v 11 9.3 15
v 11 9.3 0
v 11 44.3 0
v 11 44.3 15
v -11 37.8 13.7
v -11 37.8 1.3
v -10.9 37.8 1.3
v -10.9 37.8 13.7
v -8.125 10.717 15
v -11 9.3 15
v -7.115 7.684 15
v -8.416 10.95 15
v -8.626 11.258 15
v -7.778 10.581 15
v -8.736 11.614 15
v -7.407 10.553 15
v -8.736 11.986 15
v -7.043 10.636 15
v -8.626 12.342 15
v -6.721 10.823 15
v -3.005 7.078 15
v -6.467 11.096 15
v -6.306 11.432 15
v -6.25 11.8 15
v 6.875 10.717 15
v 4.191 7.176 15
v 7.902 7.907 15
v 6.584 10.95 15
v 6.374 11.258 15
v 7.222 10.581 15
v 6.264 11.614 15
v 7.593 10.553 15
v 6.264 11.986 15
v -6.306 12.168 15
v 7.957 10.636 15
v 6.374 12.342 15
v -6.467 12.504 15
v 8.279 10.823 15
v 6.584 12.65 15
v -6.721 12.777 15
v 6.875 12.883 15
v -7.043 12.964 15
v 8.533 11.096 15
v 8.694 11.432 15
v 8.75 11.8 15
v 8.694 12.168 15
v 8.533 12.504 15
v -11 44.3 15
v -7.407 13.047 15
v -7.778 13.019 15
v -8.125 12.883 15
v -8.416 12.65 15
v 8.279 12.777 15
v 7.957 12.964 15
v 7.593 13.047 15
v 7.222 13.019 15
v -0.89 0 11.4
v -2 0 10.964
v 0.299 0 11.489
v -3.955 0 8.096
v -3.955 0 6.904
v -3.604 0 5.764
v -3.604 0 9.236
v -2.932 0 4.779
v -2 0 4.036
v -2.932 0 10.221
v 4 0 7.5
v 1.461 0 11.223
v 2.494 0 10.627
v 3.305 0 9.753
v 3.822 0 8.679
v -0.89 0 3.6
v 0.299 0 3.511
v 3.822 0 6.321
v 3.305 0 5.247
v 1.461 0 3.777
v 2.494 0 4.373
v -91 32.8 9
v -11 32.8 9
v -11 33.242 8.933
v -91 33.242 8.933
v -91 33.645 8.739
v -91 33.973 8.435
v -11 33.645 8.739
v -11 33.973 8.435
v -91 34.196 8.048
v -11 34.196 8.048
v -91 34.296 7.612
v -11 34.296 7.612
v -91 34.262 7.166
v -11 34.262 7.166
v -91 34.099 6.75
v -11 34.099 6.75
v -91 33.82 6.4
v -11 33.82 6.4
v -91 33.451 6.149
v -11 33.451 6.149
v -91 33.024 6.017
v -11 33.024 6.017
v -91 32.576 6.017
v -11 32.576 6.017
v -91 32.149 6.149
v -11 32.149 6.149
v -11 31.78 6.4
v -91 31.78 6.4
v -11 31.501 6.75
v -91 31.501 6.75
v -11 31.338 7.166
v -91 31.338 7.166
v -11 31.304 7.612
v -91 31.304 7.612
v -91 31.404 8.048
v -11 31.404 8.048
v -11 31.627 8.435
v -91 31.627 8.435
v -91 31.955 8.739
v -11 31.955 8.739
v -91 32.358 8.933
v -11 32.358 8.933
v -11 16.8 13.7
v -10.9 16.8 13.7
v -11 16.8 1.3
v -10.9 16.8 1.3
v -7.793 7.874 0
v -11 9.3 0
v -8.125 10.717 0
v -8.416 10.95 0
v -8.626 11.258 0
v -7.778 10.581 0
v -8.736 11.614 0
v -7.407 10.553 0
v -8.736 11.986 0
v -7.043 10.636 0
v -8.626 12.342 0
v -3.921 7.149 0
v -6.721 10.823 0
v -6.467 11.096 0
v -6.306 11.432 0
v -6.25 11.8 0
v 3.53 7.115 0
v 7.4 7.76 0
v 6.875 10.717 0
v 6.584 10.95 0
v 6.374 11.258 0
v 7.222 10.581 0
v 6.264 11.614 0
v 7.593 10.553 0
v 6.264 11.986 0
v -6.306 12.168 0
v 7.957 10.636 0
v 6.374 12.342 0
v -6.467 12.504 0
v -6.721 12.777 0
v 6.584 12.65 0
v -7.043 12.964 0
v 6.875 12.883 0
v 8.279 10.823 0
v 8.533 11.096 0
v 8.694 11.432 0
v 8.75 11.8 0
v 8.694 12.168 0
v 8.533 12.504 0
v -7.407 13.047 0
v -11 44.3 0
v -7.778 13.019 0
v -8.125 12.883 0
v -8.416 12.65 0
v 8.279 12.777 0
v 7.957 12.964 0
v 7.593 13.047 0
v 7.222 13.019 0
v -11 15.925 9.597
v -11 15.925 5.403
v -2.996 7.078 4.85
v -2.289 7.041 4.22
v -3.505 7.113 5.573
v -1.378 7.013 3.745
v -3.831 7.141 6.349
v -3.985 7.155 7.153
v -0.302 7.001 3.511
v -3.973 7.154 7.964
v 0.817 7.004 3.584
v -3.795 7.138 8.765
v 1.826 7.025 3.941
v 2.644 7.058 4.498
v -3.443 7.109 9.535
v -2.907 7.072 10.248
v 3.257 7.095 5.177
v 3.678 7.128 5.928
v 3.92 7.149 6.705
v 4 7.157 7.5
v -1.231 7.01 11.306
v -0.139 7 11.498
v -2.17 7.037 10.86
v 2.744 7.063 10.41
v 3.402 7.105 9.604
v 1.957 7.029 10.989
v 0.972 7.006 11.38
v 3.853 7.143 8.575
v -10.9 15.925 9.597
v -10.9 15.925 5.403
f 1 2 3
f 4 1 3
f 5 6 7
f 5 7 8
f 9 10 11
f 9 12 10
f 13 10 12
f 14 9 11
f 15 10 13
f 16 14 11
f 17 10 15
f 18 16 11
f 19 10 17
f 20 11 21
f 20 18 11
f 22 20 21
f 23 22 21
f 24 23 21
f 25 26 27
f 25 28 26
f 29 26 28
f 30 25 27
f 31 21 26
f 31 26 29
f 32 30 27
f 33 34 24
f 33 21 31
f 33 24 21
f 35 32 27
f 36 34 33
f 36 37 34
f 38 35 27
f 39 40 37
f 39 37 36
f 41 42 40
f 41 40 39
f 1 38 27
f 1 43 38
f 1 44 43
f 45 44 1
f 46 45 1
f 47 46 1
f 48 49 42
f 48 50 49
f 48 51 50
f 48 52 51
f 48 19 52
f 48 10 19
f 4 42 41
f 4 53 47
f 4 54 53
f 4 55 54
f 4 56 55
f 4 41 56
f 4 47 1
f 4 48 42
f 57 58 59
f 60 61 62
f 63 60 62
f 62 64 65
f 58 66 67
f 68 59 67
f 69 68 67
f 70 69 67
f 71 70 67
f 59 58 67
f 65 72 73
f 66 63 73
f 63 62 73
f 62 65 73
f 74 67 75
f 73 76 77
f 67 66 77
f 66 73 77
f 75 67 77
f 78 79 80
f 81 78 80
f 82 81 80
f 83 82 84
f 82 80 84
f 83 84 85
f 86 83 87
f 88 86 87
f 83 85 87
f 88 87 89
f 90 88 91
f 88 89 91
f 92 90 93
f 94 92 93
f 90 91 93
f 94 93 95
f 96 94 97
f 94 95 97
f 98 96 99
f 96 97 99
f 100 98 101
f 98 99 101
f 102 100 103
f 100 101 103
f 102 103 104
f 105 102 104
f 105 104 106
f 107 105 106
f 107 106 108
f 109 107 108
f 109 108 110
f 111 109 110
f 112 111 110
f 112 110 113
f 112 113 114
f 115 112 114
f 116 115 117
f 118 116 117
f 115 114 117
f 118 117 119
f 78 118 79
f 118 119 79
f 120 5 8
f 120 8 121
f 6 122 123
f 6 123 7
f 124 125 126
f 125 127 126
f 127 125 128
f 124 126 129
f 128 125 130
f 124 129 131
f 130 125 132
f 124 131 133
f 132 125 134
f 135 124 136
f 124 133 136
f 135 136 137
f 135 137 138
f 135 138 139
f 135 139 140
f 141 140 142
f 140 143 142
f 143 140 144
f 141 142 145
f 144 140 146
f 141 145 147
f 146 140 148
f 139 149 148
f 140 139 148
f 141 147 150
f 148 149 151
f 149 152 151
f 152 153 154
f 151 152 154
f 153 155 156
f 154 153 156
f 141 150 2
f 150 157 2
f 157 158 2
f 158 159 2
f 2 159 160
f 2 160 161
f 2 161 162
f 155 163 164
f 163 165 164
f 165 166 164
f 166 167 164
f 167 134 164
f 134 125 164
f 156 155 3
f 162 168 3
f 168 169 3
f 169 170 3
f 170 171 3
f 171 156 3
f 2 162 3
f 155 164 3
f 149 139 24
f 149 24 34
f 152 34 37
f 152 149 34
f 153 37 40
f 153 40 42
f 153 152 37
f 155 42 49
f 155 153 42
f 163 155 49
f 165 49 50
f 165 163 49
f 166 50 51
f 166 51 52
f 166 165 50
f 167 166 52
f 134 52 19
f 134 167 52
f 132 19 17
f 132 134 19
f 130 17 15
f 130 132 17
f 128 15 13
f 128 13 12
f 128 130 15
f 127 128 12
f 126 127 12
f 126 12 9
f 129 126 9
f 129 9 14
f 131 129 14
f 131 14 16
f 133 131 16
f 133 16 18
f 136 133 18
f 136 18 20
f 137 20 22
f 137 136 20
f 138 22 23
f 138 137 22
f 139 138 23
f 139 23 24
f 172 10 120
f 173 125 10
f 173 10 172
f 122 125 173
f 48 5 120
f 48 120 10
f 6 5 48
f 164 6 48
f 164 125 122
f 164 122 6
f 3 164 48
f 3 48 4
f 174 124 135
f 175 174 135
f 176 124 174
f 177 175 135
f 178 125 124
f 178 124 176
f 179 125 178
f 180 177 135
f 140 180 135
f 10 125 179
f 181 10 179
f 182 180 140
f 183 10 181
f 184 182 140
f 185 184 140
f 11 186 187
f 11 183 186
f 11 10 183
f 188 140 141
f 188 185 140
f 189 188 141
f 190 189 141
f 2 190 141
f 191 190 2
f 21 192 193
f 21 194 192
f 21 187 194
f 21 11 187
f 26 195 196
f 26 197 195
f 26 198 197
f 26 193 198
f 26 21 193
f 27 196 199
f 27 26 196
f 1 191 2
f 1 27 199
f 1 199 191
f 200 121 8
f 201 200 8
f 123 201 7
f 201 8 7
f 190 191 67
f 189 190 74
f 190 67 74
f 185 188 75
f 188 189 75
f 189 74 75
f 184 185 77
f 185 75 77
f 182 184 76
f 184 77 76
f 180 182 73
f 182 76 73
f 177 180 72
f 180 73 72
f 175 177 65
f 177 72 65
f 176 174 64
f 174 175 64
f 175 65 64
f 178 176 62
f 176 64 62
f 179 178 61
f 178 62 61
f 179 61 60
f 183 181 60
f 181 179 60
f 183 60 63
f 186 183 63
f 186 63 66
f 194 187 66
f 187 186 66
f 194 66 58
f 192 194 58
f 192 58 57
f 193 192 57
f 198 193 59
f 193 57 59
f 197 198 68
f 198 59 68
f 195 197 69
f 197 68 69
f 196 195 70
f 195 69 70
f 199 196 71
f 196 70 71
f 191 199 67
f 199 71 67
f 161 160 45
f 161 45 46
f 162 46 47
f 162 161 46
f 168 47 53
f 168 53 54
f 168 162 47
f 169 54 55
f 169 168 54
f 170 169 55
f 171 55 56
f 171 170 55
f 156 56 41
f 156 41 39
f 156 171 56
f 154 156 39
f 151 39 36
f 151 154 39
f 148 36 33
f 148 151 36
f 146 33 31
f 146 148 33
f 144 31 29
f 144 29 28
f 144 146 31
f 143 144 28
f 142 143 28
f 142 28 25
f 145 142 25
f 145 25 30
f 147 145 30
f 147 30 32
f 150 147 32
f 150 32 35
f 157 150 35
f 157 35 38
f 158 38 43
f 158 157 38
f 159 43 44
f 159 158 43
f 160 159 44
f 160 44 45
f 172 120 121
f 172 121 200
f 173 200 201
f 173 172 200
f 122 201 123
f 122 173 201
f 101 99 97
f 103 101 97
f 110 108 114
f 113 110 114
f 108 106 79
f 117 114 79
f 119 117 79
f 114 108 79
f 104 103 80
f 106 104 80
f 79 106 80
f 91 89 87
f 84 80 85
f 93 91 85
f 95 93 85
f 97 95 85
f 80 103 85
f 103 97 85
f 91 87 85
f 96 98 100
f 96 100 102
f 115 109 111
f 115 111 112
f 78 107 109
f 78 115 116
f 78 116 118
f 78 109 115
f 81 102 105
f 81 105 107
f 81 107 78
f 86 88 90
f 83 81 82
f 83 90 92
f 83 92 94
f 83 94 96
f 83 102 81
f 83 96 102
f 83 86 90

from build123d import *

# Parameters (mm, degrees)
ESQUISSE1_W             = 22
ESQUISSE1_H             = 44.3
ESQUISSE1_R             = 1.25
BOSS_EXTRU_1_DEPTH      = 15
ENL_V_MAT_EXTRU_1_DEPTH = 16
BOSS_EXTRU_2_REACH      = 46.3
ESQUISSE3_R             = 4
ENL_V_MAT_EXTRU_2_DEPTH = 0.1
ESQUISSE5_R             = 1.5
BOSS_EXTRU_3_DEPTH      = 80


with BuildPart() as part:
    # Esquisse1 → Boss.-Extru.1 (new body)
    with BuildSketch(Plane.XY):
        with Locations((0, 22.15)):
            Rectangle(ESQUISSE1_W, ESQUISSE1_H)
        with Locations((7.5, 11.8)):
            Circle(ESQUISSE1_R, mode=Mode.SUBTRACT)
        with Locations((-7.5, 11.8)):
            Circle(ESQUISSE1_R, mode=Mode.SUBTRACT)
    extrude(amount=BOSS_EXTRU_1_DEPTH)

    # Esquisse2 → Enlèv. mat.-Extru.1 (cut, through all)
    with BuildSketch(Plane.XY.offset(15)):
        with BuildLine():
            Line((-11, 9.3), (-11, 0))
            Line((-11, 0), (11, 0))
            Line((11, 0), (11, 9.3))
            add(Edge.make_bspline(
                [(-11, 9.3), (-7.625374572, 7.236730077), (0, 6.763269923), (7.625374572, 7.236730077), (11, 9.3)],
                knots=[0, 0, 0, 0, 0.5, 1, 1, 1, 1], degree=3))
        make_face()
    extrude(amount=-ENL_V_MAT_EXTRU_1_DEPTH, mode=Mode.SUBTRACT)

    # Esquisse3 → Boss.-Extru.2 (add, up to next)
    with BuildSketch(Plane(origin=(0, 0, 0), x_dir=(1, 0, 0), z_dir=(0, 1, 0)), mode=Mode.PRIVATE) as boss_extru_2_sk1:
        with Locations((0, -7.5)):
            Circle(ESQUISSE3_R)
    boss_extru_2_tool1 = extrude(boss_extru_2_sk1.sketch, amount=BOSS_EXTRU_2_REACH, mode=Mode.PRIVATE) - part.part
    add(boss_extru_2_tool1.solids().sort_by_distance((0, 0, 7.5))[0])

    # Esquisse4 → Enlèv. mat.-Extru.2 (cut)
    with BuildSketch(Plane.ZY.offset(11)):
        with BuildLine():
            Line((1.3, 37.8), (13.7, 37.8))
            Line((13.7, 37.8), (13.7, 16.8))
            ThreePointArc((13.7, 16.8), (7.5, 15.814731131), (1.3, 16.8))
            Line((1.3, 16.8), (1.3, 37.8))
        make_face()
    extrude(amount=-ENL_V_MAT_EXTRU_2_DEPTH, mode=Mode.SUBTRACT)


with BuildPart() as body_2:
    # Esquisse5 → Boss.-Extru.3 (new body)
    with BuildSketch(Plane.ZY.offset(11)):
        with Locations((7.5, 32.8)):
            Circle(ESQUISSE5_R)
    extrude(amount=BOSS_EXTRU_3_DEPTH)


solid = Compound([part.part, body_2.part])
